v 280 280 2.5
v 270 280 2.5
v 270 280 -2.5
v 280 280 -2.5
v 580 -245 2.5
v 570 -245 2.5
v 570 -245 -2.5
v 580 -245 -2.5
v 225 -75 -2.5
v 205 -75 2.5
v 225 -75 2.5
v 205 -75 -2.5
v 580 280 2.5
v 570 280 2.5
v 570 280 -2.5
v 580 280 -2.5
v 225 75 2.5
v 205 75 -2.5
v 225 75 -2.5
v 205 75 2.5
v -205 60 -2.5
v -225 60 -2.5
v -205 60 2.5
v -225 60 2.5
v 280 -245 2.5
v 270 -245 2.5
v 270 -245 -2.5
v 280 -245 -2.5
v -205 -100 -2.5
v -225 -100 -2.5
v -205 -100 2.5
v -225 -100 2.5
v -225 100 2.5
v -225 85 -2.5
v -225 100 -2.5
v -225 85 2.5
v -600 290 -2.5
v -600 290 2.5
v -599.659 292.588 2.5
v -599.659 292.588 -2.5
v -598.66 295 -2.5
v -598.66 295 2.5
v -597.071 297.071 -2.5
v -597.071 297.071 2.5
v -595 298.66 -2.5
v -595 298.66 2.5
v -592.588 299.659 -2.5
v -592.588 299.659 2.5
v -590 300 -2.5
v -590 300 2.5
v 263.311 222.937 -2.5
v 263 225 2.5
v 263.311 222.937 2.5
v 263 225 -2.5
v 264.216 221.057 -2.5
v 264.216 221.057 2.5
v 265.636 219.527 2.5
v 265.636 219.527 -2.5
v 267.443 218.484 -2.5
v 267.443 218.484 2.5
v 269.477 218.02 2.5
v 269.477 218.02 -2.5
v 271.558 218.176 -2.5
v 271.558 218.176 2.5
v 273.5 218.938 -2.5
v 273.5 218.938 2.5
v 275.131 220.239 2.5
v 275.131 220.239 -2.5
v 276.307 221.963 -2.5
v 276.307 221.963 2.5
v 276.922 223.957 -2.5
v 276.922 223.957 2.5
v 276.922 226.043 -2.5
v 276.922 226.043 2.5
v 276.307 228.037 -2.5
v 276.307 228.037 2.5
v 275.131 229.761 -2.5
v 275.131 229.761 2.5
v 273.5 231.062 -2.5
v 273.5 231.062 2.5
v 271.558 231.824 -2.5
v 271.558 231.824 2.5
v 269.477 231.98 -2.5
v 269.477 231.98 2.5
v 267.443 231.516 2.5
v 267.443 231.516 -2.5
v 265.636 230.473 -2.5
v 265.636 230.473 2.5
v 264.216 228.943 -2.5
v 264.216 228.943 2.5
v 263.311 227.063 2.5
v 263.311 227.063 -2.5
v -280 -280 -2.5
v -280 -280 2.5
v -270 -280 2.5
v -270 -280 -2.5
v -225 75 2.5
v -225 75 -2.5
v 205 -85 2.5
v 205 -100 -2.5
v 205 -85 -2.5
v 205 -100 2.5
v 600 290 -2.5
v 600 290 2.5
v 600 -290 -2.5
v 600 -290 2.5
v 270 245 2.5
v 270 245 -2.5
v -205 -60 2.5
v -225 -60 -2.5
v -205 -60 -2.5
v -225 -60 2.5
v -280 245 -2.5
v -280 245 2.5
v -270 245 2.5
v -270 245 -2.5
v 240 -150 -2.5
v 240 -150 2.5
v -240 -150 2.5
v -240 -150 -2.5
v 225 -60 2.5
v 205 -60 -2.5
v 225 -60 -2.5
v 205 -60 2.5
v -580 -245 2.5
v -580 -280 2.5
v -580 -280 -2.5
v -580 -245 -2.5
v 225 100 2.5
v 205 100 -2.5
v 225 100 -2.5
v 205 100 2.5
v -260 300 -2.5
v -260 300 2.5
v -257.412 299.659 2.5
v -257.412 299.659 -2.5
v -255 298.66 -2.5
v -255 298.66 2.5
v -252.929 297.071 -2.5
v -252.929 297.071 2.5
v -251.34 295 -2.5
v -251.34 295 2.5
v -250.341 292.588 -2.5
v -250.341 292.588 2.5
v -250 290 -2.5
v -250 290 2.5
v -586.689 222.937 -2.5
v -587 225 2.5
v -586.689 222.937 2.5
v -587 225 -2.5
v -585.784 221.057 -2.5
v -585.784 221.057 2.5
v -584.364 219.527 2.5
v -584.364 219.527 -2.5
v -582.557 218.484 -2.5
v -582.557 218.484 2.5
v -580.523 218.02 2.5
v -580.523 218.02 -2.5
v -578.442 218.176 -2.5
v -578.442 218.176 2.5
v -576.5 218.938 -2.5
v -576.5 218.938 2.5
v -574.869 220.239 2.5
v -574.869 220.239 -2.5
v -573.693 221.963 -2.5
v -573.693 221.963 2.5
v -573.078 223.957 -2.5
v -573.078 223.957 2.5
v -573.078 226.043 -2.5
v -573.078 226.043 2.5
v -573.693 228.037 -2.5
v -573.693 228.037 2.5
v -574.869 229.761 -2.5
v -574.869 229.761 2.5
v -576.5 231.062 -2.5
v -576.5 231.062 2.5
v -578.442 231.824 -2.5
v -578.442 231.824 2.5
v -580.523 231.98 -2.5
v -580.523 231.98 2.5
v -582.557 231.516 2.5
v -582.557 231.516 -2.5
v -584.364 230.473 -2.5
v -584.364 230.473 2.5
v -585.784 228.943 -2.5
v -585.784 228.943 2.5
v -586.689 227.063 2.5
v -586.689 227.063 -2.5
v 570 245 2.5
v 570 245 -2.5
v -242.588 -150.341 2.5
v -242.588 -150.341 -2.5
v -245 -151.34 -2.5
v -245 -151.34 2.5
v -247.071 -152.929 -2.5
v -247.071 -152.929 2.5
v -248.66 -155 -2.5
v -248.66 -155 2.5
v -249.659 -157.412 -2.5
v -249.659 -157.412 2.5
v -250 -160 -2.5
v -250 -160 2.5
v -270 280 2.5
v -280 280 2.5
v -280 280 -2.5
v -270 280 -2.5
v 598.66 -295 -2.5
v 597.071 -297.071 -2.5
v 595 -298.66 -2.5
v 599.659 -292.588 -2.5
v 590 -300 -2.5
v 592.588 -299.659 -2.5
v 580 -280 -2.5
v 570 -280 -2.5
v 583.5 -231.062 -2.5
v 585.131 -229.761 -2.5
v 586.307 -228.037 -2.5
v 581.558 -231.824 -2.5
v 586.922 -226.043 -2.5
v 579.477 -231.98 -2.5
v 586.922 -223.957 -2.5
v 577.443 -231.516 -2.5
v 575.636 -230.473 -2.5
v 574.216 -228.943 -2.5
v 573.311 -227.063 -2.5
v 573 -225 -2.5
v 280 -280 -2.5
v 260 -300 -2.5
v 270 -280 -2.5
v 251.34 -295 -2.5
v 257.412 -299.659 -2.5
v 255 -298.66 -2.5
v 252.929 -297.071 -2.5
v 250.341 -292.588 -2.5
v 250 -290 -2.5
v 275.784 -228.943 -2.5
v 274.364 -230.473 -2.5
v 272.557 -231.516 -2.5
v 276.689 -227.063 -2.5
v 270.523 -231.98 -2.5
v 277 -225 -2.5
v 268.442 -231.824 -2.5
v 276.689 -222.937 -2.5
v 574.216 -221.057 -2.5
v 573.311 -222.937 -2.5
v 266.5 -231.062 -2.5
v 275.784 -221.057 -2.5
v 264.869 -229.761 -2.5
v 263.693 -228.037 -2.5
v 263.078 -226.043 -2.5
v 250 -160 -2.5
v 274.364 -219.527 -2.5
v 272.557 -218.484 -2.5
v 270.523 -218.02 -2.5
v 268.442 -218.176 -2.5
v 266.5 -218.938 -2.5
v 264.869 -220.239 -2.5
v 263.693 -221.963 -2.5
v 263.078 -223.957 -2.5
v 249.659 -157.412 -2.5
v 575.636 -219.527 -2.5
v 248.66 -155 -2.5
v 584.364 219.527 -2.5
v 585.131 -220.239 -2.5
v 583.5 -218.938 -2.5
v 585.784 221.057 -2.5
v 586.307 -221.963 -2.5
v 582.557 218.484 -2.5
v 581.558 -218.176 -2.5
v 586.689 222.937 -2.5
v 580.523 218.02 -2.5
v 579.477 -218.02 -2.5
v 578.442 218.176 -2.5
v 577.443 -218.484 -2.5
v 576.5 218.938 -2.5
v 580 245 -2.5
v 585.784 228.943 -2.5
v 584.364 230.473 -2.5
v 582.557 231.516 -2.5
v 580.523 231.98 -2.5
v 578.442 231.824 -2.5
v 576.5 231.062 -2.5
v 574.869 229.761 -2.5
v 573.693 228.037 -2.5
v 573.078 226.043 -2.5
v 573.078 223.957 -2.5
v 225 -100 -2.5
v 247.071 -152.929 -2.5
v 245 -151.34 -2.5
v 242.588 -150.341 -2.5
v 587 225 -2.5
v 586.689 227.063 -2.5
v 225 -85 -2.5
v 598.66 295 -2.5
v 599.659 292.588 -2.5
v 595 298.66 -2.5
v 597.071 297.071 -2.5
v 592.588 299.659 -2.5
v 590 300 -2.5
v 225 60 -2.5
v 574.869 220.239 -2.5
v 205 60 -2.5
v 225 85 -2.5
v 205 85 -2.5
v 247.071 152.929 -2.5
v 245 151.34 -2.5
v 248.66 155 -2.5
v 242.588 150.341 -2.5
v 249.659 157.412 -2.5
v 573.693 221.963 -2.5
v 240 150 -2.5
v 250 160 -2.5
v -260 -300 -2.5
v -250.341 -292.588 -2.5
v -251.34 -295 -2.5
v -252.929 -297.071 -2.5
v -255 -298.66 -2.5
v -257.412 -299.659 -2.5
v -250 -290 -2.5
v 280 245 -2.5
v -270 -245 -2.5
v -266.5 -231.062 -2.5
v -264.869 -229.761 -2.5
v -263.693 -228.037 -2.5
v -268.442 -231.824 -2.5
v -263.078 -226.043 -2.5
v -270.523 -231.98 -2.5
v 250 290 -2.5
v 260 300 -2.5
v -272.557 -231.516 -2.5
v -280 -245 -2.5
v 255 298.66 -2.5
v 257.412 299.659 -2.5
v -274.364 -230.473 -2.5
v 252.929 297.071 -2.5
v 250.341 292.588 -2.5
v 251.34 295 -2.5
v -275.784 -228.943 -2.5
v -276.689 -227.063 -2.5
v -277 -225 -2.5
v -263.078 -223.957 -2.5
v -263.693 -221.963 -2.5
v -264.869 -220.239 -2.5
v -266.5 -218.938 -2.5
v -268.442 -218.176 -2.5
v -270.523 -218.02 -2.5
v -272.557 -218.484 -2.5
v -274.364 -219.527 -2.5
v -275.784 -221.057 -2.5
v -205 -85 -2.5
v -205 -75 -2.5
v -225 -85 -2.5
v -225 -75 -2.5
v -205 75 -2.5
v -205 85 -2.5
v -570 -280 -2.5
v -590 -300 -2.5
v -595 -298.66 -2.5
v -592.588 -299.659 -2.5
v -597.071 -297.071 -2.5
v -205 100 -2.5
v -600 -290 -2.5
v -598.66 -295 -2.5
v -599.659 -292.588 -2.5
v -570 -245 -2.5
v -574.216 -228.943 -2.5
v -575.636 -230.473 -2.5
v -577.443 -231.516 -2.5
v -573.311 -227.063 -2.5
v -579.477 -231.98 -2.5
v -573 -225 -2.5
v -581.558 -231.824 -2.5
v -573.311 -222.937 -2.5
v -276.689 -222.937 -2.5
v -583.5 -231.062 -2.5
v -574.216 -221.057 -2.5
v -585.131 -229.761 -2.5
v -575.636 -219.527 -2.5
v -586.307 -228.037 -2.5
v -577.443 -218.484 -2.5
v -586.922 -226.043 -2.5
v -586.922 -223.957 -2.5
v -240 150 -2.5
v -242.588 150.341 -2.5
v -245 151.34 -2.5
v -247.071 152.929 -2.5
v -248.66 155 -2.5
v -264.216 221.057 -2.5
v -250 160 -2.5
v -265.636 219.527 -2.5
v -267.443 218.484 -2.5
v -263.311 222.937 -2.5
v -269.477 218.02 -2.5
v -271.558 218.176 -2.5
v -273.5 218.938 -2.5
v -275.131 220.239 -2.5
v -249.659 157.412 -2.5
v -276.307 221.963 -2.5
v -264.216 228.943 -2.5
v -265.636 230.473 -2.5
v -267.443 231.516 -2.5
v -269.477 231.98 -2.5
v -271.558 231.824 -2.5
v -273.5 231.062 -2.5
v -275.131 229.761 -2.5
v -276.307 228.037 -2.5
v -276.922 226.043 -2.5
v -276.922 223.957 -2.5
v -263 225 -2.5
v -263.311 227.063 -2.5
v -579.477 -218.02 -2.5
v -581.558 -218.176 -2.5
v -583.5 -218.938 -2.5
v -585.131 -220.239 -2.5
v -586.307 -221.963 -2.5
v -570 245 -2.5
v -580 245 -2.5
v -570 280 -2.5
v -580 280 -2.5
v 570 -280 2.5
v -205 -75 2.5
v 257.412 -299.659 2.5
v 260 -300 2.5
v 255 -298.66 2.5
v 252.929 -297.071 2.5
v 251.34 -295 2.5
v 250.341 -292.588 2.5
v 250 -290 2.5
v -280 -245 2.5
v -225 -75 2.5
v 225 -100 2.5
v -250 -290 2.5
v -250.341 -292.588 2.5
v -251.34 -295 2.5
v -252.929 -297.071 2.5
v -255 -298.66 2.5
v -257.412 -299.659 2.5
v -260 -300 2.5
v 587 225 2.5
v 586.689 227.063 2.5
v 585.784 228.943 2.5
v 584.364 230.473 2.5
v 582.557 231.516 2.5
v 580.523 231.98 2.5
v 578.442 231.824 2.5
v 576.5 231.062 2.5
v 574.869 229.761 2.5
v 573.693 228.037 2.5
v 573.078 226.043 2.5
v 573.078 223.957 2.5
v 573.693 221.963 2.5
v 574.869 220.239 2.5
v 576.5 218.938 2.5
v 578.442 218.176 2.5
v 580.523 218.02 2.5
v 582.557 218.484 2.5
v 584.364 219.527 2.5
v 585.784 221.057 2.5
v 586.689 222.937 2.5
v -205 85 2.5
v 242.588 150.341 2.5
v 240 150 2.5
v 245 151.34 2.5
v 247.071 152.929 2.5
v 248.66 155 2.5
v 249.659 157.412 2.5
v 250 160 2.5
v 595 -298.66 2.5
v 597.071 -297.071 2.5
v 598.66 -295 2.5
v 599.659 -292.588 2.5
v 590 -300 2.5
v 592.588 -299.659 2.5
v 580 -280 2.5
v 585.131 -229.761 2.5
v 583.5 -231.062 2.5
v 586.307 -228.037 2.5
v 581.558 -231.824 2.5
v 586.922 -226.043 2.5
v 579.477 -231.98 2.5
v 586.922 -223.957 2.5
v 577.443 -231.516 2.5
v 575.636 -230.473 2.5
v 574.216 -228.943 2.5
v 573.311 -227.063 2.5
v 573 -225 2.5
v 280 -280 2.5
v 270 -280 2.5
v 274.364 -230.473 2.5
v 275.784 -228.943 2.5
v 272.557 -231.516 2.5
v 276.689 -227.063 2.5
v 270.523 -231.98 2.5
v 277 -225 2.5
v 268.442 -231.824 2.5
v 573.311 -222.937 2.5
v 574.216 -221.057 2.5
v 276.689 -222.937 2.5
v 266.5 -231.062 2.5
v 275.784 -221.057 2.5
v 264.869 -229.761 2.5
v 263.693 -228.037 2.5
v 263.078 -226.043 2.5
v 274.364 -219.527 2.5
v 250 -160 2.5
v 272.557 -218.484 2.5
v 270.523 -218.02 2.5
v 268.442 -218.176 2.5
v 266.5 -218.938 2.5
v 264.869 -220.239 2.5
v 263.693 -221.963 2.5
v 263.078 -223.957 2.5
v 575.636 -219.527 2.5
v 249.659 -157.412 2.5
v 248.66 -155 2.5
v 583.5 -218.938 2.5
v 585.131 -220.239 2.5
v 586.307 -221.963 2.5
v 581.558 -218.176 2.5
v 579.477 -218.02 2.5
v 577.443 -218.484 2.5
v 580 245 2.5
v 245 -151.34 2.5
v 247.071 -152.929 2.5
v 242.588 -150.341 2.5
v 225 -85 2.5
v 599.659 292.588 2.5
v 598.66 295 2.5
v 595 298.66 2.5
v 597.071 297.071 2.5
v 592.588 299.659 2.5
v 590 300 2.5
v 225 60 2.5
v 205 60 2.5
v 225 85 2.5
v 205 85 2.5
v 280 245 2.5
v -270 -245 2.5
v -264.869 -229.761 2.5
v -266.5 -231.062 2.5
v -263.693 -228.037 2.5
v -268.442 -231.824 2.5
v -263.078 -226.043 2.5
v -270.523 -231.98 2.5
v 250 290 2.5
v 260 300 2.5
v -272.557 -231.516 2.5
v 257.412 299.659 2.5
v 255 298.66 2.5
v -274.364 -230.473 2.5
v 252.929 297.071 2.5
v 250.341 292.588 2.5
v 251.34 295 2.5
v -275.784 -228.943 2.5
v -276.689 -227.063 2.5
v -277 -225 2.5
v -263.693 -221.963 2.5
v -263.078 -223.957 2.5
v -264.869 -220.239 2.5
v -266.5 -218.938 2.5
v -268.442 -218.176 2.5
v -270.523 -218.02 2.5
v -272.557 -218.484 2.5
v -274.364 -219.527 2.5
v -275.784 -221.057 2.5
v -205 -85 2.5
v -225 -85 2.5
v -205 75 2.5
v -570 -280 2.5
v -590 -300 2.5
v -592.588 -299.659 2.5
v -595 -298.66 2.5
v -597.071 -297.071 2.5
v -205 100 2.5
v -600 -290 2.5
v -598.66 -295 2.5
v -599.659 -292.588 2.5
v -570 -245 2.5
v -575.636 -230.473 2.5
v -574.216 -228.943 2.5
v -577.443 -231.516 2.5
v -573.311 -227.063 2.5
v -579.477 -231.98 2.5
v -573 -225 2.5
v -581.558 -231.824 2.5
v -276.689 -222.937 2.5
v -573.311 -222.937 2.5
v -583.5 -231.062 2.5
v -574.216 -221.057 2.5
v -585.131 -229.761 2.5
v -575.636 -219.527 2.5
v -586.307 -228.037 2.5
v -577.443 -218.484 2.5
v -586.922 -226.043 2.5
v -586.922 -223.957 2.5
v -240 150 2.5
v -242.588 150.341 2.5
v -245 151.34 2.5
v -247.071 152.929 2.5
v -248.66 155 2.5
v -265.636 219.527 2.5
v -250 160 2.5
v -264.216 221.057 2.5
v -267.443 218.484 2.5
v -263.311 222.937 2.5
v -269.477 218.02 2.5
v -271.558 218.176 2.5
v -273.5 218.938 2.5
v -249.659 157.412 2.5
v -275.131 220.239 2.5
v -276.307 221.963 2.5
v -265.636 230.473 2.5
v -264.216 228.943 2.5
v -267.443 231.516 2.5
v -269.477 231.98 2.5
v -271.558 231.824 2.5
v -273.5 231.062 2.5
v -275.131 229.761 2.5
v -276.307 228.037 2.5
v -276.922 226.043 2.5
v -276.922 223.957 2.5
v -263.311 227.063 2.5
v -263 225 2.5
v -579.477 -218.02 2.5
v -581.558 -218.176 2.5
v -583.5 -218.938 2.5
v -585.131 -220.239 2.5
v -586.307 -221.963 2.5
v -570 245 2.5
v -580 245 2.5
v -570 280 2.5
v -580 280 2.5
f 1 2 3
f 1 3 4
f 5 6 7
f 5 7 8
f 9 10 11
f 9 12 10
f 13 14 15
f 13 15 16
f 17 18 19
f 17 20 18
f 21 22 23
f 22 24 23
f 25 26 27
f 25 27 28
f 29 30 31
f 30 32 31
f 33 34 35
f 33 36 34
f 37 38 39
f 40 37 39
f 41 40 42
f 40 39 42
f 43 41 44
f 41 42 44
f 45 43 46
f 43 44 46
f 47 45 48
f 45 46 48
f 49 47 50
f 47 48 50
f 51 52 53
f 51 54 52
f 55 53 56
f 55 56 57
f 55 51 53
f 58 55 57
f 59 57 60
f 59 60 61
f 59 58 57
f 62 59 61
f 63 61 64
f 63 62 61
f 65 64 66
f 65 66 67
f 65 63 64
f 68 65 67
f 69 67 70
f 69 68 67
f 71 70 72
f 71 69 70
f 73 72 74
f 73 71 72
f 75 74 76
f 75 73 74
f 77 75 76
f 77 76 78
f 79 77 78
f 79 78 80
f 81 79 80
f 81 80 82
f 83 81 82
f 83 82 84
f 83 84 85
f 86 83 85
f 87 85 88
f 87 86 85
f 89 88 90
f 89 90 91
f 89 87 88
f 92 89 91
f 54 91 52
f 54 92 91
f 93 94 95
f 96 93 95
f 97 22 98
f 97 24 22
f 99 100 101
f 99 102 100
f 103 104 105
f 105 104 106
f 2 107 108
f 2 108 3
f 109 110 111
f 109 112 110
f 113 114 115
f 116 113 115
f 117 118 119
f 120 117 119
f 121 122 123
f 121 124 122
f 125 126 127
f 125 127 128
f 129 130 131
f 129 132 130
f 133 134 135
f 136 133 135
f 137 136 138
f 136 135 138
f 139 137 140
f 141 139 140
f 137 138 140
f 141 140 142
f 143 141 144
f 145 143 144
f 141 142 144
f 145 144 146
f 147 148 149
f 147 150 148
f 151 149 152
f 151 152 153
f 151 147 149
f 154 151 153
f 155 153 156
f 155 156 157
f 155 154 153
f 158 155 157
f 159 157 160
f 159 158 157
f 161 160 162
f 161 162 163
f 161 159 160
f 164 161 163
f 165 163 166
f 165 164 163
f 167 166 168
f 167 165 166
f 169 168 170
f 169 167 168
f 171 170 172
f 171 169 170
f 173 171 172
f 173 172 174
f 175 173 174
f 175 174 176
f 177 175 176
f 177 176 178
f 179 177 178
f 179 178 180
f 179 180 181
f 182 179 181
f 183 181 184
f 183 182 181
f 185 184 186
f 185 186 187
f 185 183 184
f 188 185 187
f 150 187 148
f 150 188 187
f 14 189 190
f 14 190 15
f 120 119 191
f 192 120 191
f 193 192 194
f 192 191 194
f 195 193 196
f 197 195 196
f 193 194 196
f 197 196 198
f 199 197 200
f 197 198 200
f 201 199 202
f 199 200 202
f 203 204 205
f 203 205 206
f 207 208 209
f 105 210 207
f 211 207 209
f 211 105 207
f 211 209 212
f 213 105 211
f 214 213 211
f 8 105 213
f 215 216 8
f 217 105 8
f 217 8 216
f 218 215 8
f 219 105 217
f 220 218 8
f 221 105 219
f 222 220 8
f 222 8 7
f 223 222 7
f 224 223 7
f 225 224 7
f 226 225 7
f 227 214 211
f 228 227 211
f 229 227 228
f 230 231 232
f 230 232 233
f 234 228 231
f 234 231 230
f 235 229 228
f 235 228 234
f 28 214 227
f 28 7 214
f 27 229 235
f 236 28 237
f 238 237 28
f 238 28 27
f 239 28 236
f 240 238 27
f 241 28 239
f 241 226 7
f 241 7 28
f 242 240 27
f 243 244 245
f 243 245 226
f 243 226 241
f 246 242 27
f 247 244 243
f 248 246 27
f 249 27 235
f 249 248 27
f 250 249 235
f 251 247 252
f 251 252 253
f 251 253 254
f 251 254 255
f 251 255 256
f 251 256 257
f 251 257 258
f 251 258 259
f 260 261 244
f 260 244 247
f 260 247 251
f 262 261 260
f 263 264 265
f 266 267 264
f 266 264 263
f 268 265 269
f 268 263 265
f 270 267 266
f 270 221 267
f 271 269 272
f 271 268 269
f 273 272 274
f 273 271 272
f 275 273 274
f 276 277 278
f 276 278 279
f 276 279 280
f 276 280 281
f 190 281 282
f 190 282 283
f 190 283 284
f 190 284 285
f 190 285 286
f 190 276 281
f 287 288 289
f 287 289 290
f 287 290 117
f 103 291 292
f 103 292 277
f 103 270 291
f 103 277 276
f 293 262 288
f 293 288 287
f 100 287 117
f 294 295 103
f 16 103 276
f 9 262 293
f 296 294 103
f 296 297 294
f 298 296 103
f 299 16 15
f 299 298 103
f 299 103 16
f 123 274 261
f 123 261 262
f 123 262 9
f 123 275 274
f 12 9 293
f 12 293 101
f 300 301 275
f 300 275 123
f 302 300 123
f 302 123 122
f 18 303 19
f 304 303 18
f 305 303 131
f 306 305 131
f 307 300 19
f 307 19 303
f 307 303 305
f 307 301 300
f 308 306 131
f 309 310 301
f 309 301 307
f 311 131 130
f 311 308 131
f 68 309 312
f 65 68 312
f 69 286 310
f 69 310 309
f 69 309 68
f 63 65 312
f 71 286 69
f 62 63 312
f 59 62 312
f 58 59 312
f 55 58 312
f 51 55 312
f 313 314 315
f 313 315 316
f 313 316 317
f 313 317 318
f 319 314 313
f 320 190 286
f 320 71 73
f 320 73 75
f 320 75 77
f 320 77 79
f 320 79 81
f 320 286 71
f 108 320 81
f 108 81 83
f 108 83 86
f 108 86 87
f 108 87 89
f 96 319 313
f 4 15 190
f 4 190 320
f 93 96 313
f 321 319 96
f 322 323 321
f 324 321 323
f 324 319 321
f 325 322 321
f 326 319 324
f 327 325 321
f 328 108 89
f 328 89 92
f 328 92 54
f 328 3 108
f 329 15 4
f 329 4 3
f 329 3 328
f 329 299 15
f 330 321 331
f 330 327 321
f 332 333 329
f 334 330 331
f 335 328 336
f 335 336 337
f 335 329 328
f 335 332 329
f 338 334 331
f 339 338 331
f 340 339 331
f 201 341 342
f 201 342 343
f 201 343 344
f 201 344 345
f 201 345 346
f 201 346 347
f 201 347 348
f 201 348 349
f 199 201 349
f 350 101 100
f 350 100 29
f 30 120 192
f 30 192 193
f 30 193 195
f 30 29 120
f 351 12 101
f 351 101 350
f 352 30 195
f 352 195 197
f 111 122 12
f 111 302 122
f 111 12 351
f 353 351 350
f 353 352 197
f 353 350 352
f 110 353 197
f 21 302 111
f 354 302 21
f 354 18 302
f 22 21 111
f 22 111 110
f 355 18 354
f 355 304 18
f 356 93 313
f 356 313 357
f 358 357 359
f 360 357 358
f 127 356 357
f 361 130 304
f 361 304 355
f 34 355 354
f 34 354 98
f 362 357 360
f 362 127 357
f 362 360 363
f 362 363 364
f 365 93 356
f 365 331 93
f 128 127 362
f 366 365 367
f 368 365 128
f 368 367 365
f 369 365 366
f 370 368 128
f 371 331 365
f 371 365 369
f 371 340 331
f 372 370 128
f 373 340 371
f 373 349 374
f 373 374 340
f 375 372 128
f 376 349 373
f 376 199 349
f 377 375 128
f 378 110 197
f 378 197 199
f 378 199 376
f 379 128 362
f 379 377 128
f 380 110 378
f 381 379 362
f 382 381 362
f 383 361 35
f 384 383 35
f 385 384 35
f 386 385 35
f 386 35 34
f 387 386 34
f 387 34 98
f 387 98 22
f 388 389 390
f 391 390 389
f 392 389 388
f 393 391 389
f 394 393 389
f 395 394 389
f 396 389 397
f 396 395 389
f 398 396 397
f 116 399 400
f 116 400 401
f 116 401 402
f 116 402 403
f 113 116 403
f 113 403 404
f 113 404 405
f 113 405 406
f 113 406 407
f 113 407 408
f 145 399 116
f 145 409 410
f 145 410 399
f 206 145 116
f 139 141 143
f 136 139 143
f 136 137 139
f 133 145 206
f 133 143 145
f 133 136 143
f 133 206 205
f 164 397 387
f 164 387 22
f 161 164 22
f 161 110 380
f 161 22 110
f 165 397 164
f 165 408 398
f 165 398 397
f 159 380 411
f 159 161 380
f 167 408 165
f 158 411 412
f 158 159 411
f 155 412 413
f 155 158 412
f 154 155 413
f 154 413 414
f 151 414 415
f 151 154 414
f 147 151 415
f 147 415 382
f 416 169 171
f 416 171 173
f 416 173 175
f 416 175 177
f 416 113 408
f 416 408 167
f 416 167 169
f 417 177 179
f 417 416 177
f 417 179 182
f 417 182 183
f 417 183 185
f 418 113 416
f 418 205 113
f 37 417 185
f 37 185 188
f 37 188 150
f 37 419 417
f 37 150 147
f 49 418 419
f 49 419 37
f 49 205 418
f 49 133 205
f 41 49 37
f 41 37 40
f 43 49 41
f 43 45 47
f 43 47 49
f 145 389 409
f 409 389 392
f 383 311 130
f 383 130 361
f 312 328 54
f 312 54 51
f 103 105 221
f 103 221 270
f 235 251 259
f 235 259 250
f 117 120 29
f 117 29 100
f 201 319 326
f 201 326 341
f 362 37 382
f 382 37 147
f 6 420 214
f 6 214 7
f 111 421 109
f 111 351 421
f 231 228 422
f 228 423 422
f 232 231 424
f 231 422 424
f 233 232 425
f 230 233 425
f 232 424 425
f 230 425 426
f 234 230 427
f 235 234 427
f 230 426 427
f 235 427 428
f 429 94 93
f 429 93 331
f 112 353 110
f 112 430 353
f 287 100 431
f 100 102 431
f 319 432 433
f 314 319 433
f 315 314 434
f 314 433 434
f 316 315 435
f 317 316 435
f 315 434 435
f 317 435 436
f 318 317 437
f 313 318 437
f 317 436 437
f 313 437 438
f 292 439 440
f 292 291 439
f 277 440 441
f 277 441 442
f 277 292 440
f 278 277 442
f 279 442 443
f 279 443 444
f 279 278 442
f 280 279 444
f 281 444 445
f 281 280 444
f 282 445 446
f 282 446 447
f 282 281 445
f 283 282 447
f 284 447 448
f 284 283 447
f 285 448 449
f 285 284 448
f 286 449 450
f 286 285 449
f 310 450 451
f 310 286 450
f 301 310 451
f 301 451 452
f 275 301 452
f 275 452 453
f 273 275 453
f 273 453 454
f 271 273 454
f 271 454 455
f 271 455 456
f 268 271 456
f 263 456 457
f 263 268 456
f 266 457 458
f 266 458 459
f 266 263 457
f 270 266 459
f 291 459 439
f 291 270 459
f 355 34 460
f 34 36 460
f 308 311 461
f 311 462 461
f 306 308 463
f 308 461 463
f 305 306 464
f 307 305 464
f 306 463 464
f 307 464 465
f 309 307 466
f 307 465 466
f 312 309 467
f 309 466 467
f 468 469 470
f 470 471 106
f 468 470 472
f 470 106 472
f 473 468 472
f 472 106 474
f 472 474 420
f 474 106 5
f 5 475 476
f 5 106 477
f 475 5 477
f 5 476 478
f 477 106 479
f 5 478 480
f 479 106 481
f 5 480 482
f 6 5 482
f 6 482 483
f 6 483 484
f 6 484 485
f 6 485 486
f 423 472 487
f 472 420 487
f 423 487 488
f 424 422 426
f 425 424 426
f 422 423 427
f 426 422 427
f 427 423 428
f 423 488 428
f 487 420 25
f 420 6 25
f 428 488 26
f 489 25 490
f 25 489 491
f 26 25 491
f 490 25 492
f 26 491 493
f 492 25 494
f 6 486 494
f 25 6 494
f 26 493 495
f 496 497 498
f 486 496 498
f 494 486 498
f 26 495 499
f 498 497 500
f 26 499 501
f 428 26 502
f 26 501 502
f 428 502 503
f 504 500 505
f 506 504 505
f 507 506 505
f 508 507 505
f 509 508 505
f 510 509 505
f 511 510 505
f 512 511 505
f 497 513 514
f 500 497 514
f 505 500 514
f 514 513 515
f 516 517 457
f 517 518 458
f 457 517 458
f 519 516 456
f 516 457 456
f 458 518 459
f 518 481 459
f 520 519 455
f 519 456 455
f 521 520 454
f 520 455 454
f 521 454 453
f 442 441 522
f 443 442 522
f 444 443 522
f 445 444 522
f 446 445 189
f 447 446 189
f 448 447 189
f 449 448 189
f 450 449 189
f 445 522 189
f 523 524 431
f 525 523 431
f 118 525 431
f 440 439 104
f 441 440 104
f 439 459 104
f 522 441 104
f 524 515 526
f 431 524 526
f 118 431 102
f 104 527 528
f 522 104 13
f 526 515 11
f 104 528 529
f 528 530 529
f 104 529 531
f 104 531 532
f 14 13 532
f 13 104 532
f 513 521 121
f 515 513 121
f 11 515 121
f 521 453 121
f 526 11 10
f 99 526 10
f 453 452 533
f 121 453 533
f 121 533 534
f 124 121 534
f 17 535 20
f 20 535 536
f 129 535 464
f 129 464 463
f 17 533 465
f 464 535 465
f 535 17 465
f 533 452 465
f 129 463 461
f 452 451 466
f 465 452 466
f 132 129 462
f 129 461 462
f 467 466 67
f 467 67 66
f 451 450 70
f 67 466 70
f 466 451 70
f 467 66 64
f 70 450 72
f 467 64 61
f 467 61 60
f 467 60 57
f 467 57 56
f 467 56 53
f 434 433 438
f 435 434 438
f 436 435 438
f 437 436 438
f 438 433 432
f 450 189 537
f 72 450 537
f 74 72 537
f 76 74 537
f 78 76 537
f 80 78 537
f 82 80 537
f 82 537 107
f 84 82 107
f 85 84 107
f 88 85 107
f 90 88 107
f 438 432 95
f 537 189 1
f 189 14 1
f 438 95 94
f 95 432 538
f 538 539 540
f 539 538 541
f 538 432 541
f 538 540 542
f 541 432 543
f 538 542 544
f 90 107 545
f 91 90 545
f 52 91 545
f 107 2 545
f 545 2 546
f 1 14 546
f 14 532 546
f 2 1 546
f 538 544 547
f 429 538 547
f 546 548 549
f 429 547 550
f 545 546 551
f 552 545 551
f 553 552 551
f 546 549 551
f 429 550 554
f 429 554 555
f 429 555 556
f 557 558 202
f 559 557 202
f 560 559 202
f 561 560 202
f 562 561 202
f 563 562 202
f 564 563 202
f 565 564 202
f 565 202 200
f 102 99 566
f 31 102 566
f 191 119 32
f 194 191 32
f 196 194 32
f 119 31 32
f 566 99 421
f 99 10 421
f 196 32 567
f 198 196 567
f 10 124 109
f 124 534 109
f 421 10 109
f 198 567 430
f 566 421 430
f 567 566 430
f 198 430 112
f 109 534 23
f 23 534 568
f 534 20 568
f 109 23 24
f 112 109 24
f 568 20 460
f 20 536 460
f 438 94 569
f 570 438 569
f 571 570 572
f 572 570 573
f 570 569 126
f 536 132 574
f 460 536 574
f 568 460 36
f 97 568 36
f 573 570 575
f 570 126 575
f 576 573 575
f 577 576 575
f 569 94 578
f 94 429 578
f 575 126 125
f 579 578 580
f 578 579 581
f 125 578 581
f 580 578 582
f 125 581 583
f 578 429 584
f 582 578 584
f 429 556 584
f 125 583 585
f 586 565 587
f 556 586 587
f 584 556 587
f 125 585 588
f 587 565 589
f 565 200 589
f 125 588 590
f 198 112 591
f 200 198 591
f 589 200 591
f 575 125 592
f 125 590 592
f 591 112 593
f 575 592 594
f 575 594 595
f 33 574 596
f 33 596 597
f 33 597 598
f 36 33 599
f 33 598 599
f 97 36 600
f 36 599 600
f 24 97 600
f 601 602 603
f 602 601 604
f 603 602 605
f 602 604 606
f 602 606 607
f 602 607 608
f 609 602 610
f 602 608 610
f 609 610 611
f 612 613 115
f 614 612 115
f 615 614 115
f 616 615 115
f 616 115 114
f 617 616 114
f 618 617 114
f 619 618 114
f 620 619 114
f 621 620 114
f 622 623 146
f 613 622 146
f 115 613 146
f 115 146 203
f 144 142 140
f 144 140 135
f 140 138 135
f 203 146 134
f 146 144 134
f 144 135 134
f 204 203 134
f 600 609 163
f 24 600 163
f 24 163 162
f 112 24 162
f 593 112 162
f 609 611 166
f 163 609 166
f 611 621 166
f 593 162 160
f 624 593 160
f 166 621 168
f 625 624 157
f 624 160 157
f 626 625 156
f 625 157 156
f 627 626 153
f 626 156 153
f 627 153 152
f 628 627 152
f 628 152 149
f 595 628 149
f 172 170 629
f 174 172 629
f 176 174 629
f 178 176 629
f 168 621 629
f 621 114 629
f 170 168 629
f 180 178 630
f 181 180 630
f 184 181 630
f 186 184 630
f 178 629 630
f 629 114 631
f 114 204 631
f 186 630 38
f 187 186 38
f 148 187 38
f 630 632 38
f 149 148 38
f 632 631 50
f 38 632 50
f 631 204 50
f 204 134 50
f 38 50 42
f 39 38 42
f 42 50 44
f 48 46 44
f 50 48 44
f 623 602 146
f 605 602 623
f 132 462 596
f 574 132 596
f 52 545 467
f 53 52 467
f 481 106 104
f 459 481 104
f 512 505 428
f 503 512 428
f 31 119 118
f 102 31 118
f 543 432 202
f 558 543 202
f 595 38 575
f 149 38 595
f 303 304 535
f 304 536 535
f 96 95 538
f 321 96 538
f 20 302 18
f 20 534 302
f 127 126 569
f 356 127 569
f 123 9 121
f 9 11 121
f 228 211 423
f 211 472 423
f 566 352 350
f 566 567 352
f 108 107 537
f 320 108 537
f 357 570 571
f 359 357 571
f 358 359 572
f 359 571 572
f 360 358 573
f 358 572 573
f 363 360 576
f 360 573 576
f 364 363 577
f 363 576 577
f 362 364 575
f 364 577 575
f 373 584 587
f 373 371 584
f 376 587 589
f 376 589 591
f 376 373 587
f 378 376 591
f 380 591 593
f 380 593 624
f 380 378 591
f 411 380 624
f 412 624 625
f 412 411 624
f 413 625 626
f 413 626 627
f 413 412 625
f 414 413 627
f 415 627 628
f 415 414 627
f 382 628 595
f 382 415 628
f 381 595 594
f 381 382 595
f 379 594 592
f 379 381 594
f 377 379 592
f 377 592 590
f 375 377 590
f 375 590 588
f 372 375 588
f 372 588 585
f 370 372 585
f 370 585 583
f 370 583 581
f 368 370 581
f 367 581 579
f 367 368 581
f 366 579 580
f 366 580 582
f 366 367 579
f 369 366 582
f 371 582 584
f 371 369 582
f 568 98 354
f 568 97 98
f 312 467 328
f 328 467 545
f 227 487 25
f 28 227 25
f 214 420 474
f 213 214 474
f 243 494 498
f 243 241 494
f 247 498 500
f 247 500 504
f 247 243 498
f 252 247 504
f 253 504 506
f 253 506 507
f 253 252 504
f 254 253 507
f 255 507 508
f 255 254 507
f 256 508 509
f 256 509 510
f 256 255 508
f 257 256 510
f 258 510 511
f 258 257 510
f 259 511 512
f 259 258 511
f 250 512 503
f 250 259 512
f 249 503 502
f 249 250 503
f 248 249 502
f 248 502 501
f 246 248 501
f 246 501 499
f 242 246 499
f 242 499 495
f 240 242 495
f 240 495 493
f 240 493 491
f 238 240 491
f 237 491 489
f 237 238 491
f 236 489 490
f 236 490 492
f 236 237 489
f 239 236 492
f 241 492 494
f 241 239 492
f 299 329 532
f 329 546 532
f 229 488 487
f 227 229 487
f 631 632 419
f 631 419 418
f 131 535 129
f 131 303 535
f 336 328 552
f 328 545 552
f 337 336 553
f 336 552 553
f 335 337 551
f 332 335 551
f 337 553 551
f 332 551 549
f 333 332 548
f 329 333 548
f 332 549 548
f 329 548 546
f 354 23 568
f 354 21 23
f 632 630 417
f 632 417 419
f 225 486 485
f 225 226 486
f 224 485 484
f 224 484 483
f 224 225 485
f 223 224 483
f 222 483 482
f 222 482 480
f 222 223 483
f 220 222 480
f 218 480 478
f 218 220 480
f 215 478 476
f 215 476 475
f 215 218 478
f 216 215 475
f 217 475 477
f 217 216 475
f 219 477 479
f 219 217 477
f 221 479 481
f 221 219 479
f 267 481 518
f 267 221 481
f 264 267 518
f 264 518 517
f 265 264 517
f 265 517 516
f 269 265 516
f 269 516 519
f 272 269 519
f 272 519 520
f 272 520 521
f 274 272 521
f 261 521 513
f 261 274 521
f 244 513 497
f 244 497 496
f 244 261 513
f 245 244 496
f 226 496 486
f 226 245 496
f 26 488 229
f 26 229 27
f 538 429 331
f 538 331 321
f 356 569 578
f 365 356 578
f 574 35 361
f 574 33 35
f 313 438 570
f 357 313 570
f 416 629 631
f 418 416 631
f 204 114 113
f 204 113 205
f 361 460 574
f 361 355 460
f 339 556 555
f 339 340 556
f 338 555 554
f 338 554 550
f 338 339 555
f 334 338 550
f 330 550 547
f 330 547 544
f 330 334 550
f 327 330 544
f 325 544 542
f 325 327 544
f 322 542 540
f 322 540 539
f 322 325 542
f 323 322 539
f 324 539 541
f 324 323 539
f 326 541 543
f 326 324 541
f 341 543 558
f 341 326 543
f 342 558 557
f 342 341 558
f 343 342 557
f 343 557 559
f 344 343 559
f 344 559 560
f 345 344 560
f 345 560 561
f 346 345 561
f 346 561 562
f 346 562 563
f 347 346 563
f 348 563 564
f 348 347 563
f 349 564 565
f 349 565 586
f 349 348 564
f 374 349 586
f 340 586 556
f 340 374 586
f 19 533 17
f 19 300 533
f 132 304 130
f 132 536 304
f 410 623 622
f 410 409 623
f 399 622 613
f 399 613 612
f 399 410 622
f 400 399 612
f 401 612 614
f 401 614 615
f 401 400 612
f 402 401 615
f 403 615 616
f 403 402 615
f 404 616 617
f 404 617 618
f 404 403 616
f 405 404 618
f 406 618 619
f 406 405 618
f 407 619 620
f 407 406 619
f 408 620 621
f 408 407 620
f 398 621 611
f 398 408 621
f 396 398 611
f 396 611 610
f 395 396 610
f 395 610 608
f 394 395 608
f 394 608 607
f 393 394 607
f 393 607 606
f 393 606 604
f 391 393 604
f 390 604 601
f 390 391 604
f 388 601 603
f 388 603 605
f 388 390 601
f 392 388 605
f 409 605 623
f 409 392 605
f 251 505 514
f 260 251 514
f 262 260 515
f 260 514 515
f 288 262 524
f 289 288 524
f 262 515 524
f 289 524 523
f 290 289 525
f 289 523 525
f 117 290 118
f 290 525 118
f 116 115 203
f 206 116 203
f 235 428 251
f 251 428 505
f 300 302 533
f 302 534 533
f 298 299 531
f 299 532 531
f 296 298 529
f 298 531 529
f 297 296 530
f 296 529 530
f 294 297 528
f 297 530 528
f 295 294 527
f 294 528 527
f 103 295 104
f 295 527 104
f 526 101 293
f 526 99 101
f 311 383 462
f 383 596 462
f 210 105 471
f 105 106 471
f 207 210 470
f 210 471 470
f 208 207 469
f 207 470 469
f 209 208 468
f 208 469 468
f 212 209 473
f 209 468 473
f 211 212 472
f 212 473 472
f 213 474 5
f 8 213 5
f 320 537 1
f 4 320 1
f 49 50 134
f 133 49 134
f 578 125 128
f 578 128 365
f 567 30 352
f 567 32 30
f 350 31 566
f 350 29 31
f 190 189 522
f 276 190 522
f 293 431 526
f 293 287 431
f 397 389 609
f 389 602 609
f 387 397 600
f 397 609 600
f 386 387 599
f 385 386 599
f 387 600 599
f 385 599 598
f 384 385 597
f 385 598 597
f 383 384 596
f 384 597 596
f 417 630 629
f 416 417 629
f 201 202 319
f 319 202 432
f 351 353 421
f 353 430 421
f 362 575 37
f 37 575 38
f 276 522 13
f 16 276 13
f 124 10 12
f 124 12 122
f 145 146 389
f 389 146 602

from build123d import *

# Parameters (mm, degrees)
SKETCH_1_R          = 7
SKETCH_1_W          = 20
SKETCH_1_H          = 15
EXTRUDE_1_DEPTH     = 2.5
SKETCH_2_W          = 10
SKETCH_2_H          = 35
CUT_EXTRUDE_3_DEPTH = 671.839026891


with BuildPart() as part:
    # 草图1 → 凸台-拉伸1 (new, symmetric)
    with BuildSketch(Plane.XY):
        with BuildLine():
            Line((-250, 290), (-250, 160))
            ThreePointArc((-250, 160), (-247.071067812, 152.928932188), (-240, 150))
            Line((-240, 150), (240, 150))
            ThreePointArc((240, 150), (247.071067812, 152.928932188), (250, 160))
            Line((250, 160), (250, 290))
            ThreePointArc((250, 290), (252.928932188, 297.071067812), (260, 300))
            Line((260, 300), (590, 300))
            ThreePointArc((590, 300), (597.071067812, 297.071067812), (600, 290))
            Line((600, 290), (600, -290))
            ThreePointArc((600, -290), (597.071067812, -297.071067812), (590, -300))
            Line((590, -300), (260, -300))
            ThreePointArc((260, -300), (252.928932188, -297.071067812), (250, -290))
            Line((250, -290), (250, -160))
            ThreePointArc((250, -160), (247.071067812, -152.928932188), (240, -150))
            Line((240, -150), (-240, -150))
            ThreePointArc((-240, -150), (-247.071067812, -152.928932188), (-250, -160))
            Line((-250, -160), (-250, -290))
            ThreePointArc((-250, -290), (-252.928932188, -297.071067812), (-260, -300))
            Line((-260, -300), (-590, -300))
            ThreePointArc((-590, -300), (-597.071067812, -297.071067812), (-600, -290))
            Line((-600, -290), (-600, 290))
            ThreePointArc((-600, 290), (-597.071067812, 297.071067812), (-590, 300))
            Line((-590, 300), (-260, 300))
            ThreePointArc((-260, 300), (-252.928932188, 297.071067812), (-250, 290))
        make_face()
        with Locations((-580, -225)):
            Circle(SKETCH_1_R, mode=Mode.SUBTRACT)
        with Locations(Location((-580, 225, 0), (0, 0, 180))):
            Circle(SKETCH_1_R, mode=Mode.SUBTRACT)
        with Locations((-270, 225)):
            Circle(SKETCH_1_R, mode=Mode.SUBTRACT)
        with Locations(Location((-270, -225, 0), (0, 0, 180))):
            Circle(SKETCH_1_R, mode=Mode.SUBTRACT)
        with Locations((270, -225)):
            Circle(SKETCH_1_R, mode=Mode.SUBTRACT)
        with Locations(Location((580, -225, 0), (0, 0, 180))):
            Circle(SKETCH_1_R, mode=Mode.SUBTRACT)
        with Locations(Location((270, 225, 0), (0, 0, 180))):
            Circle(SKETCH_1_R, mode=Mode.SUBTRACT)
        with Locations((580, 225)):
            Circle(SKETCH_1_R, mode=Mode.SUBTRACT)
        with Locations((-215, -67.5)):
            Rectangle(SKETCH_1_W, SKETCH_1_H, mode=Mode.SUBTRACT)
        with Locations((-215, 92.5)):
            Rectangle(SKETCH_1_W, SKETCH_1_H, mode=Mode.SUBTRACT)
        with Locations((-215, 67.5)):
            Rectangle(SKETCH_1_W, SKETCH_1_H, mode=Mode.SUBTRACT)
        with Locations((-215, -92.5)):
            Rectangle(SKETCH_1_W, SKETCH_1_H, mode=Mode.SUBTRACT)
        with Locations((215, -92.5)):
            Rectangle(SKETCH_1_W, SKETCH_1_H, mode=Mode.SUBTRACT)
        with Locations((215, 67.5)):
            Rectangle(SKETCH_1_W, SKETCH_1_H, mode=Mode.SUBTRACT)
        with Locations((215, 92.5)):
            Rectangle(SKETCH_1_W, SKETCH_1_H, mode=Mode.SUBTRACT)
        with Locations((215, -67.5)):
            Rectangle(SKETCH_1_W, SKETCH_1_H, mode=Mode.SUBTRACT)
    extrude(amount=EXTRUDE_1_DEPTH, both=True)

    # 草图2 → 切除-拉伸3 (cut, through all)
    with BuildSketch(Plane.XY.offset(2.5)):
        with Locations((-575, 262.5)):
            Rectangle(SKETCH_2_W, SKETCH_2_H)
        with Locations((-575, -262.5)):
            Rectangle(SKETCH_2_W, SKETCH_2_H)
        with Locations((575, -262.5)):
            Rectangle(SKETCH_2_W, SKETCH_2_H)
        with Locations((575, 262.5)):
            Rectangle(SKETCH_2_W, SKETCH_2_H)
        with Locations((275, -262.5)):
            Rectangle(SKETCH_2_W, SKETCH_2_H)
        with Locations((275, 262.5)):
            Rectangle(SKETCH_2_W, SKETCH_2_H)
        with Locations((-275, 262.5)):
            Rectangle(SKETCH_2_W, SKETCH_2_H)
        with Locations((-275, -262.5)):
            Rectangle(SKETCH_2_W, SKETCH_2_H)
    extrude(amount=-CUT_EXTRUDE_3_DEPTH, mode=Mode.SUBTRACT)


solid = part.part
